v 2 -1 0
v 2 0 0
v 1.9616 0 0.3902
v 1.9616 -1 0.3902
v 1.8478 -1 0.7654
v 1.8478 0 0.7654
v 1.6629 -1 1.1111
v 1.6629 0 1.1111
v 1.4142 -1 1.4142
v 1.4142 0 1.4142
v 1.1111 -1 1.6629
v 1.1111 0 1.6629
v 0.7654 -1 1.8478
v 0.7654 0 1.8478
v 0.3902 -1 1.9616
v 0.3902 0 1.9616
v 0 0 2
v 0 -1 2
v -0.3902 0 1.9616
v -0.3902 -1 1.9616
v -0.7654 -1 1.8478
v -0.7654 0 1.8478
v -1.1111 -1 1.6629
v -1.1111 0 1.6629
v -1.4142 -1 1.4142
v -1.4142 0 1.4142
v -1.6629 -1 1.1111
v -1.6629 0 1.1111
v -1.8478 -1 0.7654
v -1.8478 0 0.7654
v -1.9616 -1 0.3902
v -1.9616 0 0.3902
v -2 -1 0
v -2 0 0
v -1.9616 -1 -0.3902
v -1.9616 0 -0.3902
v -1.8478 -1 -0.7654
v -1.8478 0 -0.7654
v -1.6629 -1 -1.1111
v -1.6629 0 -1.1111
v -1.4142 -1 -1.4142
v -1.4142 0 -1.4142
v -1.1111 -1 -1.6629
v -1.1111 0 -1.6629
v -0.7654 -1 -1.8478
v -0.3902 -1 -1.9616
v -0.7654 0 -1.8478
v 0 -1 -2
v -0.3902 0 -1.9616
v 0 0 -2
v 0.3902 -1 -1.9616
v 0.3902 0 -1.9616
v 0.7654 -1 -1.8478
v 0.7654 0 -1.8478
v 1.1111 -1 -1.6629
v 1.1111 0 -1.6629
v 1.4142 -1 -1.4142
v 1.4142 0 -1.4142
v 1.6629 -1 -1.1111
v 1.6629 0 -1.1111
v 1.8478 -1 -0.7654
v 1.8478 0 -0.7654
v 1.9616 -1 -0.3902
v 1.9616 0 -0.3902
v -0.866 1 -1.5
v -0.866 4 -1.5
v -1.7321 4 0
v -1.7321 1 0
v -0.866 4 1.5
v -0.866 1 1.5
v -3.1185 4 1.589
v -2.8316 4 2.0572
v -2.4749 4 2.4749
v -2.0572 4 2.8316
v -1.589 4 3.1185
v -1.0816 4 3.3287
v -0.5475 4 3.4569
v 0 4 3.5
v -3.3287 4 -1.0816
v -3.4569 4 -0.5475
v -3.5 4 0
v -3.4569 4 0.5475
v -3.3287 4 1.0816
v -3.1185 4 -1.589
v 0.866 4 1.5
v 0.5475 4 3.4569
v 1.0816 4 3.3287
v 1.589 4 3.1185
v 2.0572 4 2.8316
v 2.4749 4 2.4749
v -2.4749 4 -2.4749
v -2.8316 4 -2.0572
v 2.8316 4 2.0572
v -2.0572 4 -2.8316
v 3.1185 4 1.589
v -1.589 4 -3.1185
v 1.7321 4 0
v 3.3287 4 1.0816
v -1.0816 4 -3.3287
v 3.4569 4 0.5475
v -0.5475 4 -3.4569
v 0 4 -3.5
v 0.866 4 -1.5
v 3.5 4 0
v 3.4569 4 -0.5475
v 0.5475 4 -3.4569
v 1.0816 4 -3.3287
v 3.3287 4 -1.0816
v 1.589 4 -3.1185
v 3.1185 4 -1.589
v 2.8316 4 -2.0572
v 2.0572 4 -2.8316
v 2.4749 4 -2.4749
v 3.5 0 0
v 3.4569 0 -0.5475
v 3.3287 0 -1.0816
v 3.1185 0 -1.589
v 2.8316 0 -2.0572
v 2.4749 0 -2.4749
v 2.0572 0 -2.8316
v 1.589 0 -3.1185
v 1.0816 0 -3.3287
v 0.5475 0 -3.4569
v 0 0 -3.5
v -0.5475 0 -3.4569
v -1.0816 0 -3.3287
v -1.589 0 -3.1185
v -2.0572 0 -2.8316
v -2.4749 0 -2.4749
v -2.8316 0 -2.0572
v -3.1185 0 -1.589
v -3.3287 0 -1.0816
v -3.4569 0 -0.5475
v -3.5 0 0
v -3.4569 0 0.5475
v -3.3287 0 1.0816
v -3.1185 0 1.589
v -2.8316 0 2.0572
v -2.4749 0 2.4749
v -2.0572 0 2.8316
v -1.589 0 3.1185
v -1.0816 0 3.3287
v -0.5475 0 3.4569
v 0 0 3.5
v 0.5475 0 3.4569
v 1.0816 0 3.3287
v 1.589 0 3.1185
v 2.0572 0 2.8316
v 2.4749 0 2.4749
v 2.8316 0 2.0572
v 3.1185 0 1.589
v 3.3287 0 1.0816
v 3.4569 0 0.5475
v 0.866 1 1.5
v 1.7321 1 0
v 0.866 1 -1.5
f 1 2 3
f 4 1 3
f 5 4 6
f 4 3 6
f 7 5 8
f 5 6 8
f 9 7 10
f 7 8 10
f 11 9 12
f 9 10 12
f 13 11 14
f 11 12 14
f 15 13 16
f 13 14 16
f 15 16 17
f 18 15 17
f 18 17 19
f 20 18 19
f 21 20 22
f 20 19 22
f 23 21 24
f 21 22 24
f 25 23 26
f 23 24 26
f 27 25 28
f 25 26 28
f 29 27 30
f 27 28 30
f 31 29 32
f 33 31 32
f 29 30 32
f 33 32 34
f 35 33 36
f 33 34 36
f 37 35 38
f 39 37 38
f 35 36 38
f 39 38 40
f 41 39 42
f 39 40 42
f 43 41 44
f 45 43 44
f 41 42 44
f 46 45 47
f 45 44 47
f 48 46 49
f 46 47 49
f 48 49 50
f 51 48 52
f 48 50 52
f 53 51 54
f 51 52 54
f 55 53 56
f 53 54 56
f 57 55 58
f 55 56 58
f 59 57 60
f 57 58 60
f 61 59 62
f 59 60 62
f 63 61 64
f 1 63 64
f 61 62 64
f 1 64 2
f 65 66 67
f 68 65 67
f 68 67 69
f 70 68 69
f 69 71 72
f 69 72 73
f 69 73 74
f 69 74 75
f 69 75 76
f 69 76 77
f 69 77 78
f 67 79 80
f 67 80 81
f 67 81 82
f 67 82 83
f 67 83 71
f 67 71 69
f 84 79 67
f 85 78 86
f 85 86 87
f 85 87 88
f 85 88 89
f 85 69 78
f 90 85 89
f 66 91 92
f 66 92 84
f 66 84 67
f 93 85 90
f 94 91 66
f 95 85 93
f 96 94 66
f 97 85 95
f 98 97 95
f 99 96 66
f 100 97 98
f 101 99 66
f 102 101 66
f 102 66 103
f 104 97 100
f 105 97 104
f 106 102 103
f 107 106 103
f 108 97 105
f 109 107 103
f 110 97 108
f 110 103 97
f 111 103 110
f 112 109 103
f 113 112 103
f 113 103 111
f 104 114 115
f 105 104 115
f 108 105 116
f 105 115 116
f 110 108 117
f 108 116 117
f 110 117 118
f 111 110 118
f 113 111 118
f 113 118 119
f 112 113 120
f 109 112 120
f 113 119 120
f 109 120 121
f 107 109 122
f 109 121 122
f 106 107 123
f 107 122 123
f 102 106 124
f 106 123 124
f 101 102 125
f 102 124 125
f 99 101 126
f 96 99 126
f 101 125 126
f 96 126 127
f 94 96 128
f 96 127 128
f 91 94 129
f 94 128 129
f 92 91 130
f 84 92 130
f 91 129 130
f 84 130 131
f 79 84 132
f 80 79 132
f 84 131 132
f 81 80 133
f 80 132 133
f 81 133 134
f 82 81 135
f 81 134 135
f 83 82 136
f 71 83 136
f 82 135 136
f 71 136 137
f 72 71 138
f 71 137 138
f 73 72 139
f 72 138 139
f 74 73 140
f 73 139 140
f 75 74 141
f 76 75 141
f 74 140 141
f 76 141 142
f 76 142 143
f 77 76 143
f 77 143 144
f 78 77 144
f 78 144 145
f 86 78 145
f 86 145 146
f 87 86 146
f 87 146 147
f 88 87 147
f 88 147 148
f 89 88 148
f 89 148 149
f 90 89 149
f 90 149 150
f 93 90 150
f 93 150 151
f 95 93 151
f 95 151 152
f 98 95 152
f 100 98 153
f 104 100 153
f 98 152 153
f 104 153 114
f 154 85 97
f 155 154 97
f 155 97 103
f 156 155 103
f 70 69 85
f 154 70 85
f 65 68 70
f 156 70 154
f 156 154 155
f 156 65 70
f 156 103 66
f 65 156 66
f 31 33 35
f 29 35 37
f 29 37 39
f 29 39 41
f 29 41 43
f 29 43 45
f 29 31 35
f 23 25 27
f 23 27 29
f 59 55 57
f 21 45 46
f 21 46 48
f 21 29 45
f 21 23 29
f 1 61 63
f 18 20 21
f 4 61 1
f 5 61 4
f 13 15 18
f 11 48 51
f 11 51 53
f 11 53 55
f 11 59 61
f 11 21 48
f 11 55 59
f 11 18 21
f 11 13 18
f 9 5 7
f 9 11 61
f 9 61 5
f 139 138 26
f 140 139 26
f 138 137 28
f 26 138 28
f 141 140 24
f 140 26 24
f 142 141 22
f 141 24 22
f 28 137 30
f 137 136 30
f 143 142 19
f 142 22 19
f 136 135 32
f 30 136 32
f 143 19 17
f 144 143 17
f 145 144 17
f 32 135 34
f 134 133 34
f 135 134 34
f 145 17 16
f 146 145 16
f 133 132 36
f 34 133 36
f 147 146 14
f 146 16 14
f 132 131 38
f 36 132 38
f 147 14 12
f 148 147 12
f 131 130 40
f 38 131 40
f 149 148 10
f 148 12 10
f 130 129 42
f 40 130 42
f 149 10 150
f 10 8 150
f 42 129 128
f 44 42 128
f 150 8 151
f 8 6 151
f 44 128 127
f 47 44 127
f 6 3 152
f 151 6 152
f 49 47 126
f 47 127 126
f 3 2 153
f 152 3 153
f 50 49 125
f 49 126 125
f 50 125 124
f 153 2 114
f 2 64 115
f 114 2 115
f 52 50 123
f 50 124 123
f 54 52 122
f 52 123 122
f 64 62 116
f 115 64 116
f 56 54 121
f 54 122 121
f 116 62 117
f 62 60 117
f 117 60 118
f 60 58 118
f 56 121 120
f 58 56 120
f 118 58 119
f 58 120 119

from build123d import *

# Parameters (mm, degrees)
SKETCH1_R           = 3.5
BOSS_EXTRUDE1_DEPTH = 4
SKETCH2_R           = 2
BOSS_EXTRUDE2_DEPTH = 1
CUT_EXTRUDE1_DEPTH  = 3


with BuildPart() as part:
    # Sketch1 → Boss-Extrude1 (new body)
    with BuildSketch(Plane(origin=(0, 0, 0), x_dir=(1, 0, 0), z_dir=(0, 1, 0))):
        Circle(SKETCH1_R)
    extrude(amount=BOSS_EXTRUDE1_DEPTH)

    # Sketch2 → Boss-Extrude2 (add)
    with BuildSketch(Plane.XZ):
        Circle(SKETCH2_R)
    extrude(amount=BOSS_EXTRUDE2_DEPTH)

    # Sketch3 → Cut-Extrude1 (cut)
    with BuildSketch(Plane(origin=(0, 4, 0), x_dir=(1, 0, 0), z_dir=(0, 1, 0))):
        Polygon((1.732050808, 0), (0.866025404, 1.5), (-0.866025404, 1.5), (-1.732050808, 0), (-0.866025404, -1.5), (0.866025404, -1.5), align=None)
    extrude(amount=-CUT_EXTRUDE1_DEPTH, mode=Mode.SUBTRACT)


solid = part.part
